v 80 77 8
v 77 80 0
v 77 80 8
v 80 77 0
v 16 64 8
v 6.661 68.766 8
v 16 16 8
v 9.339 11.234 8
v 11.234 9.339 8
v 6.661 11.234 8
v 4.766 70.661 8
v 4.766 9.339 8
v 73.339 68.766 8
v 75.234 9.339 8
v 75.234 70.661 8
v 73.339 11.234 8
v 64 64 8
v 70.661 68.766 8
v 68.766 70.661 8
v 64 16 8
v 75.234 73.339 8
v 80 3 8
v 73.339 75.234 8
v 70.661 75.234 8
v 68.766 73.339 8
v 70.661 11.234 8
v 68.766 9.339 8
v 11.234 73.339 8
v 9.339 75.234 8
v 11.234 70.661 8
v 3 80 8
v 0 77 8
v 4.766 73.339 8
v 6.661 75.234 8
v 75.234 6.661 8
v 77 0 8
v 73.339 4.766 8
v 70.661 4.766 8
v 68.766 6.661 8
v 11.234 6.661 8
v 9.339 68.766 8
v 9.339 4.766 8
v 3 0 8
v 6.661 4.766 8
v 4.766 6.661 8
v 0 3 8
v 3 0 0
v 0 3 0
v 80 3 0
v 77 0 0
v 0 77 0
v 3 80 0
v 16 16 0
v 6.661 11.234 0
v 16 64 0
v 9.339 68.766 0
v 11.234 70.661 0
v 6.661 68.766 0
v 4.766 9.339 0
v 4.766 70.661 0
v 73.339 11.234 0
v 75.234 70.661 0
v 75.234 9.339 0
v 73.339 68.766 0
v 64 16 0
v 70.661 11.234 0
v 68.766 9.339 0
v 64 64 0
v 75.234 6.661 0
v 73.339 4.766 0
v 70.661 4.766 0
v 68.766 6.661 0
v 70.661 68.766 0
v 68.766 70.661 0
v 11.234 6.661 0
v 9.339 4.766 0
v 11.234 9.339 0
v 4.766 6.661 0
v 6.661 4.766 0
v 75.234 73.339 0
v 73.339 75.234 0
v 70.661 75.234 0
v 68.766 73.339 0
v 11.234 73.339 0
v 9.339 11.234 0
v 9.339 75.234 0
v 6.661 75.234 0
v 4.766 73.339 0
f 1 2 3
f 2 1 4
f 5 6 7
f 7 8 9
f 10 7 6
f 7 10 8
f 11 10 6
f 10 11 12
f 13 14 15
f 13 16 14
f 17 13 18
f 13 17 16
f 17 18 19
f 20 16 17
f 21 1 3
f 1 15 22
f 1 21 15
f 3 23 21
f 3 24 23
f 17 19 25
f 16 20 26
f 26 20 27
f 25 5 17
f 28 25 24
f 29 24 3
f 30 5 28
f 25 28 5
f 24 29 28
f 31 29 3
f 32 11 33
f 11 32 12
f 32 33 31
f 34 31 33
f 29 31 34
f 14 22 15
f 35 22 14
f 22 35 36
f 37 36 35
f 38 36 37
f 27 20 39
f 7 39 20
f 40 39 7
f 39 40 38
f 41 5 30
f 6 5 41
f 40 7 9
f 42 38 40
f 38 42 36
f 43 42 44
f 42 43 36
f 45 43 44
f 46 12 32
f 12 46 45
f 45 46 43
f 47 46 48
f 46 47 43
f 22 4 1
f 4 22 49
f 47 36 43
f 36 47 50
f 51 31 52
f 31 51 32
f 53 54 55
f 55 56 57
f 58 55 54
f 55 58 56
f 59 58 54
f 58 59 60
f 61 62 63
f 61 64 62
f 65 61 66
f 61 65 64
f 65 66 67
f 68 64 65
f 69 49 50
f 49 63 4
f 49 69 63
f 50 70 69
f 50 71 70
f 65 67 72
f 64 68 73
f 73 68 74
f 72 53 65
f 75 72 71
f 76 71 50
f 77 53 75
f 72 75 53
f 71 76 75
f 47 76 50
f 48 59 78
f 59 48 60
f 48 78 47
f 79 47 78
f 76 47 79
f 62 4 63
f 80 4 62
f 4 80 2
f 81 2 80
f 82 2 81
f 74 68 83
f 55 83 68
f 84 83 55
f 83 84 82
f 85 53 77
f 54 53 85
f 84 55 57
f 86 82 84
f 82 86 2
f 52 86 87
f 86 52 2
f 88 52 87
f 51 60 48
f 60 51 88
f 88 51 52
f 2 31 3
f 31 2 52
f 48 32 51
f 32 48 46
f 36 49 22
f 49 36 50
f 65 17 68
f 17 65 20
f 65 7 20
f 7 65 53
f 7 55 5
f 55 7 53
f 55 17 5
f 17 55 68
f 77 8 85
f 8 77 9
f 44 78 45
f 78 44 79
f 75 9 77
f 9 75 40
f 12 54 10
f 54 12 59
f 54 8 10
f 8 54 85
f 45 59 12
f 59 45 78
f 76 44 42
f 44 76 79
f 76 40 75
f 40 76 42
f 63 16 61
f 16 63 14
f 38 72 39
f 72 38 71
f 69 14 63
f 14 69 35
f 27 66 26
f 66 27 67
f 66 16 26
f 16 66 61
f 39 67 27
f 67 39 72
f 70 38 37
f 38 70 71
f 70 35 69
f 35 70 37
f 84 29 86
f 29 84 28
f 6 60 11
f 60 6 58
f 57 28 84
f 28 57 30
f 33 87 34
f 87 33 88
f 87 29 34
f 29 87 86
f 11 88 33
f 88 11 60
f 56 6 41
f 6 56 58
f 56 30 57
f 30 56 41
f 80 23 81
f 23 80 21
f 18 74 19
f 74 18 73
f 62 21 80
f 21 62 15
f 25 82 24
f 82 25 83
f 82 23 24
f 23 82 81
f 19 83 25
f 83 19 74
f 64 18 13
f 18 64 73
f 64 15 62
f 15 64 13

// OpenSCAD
$fn = 32;

// ----------------------------------------------------------------------
// Frame plate: 80 x 80 frame, 16 mm rails
// ----------------------------------------------------------------------

// --- parameters (mm) ---
plate_l = 80;             // plate length, X
plate_w = 80;             // plate width, Y
plate_t = 8;              // plate thickness, Z (extrusion height)
corner_c = 3;             // corner chamfer
frame_bar = 16;           // frame rail width
bolt_r = 3.5;             // corner bolt window radius
bolt_inset = 8;           // bolt centre inset from the edges

win_l = plate_l - 2 * frame_bar;  // window length
win_w = plate_w - 2 * frame_bar;  // window width
bolt_d = 2 * bolt_r;  // corner hole diameter

profile = [[3, 0], [77, 0], [80, 3], [80, 77], [77, 80], [3, 80], [0, 77], [0, 3]];  // primary outline, 8 points, counter clockwise
void_1 = [[16, 16], [64, 16], [64, 64], [16, 64]];  // the window, 4 points
void_2 = [[11.234, 9.339], [9.339, 11.234], [6.661, 11.234], [4.766, 9.339], [4.766, 6.661], [6.661, 4.766], [9.339, 4.766], [11.234, 6.661]];  // corner bolt window, 8 points
void_3 = [[75.234, 9.339], [73.339, 11.234], [70.661, 11.234], [68.766, 9.339], [68.766, 6.661], [70.661, 4.766], [73.339, 4.766], [75.234, 6.661]];  // corner bolt window, 8 points
void_4 = [[11.234, 73.339], [9.339, 75.234], [6.661, 75.234], [4.766, 73.339], [4.766, 70.661], [6.661, 68.766], [9.339, 68.766], [11.234, 70.661]];  // corner bolt window, 8 points
void_5 = [[75.234, 73.339], [73.339, 75.234], [70.661, 75.234], [68.766, 73.339], [68.766, 70.661], [70.661, 68.766], [73.339, 68.766], [75.234, 70.661]];  // corner bolt window, 8 points

// --- the one profile operation ---
difference() {
  linear_extrude(height = plate_t) polygon(points = profile);
  translate([0, 0, -1])
    linear_extrude(height = plate_t + 2) polygon(points = void_1);
  translate([0, 0, -1])
    linear_extrude(height = plate_t + 2) polygon(points = void_2);
  translate([0, 0, -1])
    linear_extrude(height = plate_t + 2) polygon(points = void_3);
  translate([0, 0, -1])
    linear_extrude(height = plate_t + 2) polygon(points = void_4);
  translate([0, 0, -1])
    linear_extrude(height = plate_t + 2) polygon(points = void_5);
}
